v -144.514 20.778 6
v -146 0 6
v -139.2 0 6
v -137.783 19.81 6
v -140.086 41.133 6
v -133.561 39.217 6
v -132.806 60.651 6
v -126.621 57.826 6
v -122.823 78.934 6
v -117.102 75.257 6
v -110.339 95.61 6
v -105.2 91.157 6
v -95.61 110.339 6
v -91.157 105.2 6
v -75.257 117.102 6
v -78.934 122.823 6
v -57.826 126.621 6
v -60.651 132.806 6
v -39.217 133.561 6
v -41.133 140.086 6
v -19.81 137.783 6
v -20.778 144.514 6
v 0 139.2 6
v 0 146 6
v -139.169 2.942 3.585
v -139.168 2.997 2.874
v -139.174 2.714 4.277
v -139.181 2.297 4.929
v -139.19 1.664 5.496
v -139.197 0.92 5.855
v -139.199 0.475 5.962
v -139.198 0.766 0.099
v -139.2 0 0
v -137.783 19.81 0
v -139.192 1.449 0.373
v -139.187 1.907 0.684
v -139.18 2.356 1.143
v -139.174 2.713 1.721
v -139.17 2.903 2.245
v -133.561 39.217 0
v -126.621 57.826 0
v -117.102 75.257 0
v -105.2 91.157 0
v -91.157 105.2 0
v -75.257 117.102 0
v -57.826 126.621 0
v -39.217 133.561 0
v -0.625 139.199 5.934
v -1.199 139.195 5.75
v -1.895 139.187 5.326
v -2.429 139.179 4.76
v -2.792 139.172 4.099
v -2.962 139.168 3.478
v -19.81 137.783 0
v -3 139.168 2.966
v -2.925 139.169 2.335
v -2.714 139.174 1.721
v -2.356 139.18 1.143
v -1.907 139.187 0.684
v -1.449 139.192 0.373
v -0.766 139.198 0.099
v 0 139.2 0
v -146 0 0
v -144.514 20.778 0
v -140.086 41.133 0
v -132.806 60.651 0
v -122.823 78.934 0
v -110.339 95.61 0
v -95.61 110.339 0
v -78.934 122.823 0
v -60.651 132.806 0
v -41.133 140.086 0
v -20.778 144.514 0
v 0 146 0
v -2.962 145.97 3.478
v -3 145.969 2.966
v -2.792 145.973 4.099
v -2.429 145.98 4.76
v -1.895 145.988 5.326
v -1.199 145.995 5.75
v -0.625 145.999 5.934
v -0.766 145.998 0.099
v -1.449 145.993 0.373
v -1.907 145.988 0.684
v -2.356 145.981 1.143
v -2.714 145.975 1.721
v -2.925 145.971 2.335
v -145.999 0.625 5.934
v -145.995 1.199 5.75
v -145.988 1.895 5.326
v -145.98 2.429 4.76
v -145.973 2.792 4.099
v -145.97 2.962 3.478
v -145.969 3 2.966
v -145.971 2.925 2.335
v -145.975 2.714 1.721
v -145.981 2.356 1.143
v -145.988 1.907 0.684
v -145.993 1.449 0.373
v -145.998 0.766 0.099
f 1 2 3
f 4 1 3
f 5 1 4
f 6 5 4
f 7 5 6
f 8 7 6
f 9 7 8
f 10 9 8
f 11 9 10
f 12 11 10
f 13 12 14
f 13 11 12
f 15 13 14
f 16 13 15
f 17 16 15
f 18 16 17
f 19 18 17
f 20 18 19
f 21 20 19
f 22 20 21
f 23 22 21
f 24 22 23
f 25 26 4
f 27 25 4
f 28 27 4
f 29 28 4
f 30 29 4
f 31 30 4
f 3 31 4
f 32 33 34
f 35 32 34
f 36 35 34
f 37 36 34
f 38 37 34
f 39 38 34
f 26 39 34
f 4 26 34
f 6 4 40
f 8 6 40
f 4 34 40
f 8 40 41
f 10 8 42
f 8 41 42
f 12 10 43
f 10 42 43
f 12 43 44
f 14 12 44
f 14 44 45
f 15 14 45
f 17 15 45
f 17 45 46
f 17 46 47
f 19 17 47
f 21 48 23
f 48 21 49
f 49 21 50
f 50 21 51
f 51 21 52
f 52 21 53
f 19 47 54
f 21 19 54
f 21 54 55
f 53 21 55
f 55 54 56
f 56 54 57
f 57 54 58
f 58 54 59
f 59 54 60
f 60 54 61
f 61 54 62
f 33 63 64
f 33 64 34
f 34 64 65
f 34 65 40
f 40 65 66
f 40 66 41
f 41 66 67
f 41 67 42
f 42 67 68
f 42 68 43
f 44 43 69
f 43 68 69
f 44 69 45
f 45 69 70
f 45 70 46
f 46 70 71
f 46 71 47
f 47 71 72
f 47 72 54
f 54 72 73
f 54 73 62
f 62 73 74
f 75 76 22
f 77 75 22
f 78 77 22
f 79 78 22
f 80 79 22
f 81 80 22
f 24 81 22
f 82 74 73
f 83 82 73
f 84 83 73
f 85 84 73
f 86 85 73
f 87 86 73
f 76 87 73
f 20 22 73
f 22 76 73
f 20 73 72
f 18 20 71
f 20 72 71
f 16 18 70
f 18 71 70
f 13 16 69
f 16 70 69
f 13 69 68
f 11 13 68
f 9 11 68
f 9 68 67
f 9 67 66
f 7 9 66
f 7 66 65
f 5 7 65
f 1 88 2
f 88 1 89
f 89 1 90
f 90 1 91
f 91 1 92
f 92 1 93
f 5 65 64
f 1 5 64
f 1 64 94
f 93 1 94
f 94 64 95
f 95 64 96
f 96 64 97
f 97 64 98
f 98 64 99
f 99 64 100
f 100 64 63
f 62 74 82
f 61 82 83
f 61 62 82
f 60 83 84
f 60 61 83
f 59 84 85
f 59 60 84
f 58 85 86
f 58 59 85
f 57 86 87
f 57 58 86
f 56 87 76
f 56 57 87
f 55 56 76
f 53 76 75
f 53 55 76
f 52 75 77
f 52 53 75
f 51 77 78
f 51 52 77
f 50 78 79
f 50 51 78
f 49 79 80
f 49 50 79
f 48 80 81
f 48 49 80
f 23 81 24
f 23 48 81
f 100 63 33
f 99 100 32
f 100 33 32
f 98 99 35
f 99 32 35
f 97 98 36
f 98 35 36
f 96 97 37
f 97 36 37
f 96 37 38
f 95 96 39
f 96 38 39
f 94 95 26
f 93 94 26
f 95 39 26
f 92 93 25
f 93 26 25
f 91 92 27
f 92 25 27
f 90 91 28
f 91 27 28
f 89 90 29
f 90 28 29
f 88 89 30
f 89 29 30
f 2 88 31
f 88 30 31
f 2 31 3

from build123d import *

# Parameters (mm, degrees)
BOSS_EXTRUDE1_DEPTH = 6
SKETCH3_R           = 3
CUT_EXTRUDE1_DEPTH  = 172
SKETCH4_R           = 3
CUT_EXTRUDE2_DEPTH  = 175


with BuildPart() as part:
    # Sketch2 → Boss-Extrude1 (new body)
    with BuildSketch(Plane.XY):
        with BuildLine():
            Line((0, 139.2), (0, 146))
            ThreePointArc((0, 146), (-103.237590053, 103.237590053), (-146, 0))
            Line((-146, 0), (-139.2, 0))
            ThreePointArc((-139.2, 0), (-98.429263941, 98.429263941), (0, 139.2))
        make_face()
    extrude(amount=BOSS_EXTRUDE1_DEPTH)

    # Sketch3 → Cut-Extrude1 (cut)
    with BuildSketch(Plane(origin=(0, 0, 0), x_dir=(0, 0, -1), z_dir=(1, 0, 0))):
        with Locations((-3, 0)):
            Circle(SKETCH3_R)
    extrude(amount=-CUT_EXTRUDE1_DEPTH, mode=Mode.SUBTRACT)

    # Sketch4 → Cut-Extrude2 (cut)
    with BuildSketch(Plane(origin=(0, 0, 0), x_dir=(1, 0, 0), z_dir=(0, 1, 0))):
        with Locations((0, -3)):
            Circle(SKETCH4_R)
    extrude(amount=CUT_EXTRUDE2_DEPTH, mode=Mode.SUBTRACT)


solid = part.part
